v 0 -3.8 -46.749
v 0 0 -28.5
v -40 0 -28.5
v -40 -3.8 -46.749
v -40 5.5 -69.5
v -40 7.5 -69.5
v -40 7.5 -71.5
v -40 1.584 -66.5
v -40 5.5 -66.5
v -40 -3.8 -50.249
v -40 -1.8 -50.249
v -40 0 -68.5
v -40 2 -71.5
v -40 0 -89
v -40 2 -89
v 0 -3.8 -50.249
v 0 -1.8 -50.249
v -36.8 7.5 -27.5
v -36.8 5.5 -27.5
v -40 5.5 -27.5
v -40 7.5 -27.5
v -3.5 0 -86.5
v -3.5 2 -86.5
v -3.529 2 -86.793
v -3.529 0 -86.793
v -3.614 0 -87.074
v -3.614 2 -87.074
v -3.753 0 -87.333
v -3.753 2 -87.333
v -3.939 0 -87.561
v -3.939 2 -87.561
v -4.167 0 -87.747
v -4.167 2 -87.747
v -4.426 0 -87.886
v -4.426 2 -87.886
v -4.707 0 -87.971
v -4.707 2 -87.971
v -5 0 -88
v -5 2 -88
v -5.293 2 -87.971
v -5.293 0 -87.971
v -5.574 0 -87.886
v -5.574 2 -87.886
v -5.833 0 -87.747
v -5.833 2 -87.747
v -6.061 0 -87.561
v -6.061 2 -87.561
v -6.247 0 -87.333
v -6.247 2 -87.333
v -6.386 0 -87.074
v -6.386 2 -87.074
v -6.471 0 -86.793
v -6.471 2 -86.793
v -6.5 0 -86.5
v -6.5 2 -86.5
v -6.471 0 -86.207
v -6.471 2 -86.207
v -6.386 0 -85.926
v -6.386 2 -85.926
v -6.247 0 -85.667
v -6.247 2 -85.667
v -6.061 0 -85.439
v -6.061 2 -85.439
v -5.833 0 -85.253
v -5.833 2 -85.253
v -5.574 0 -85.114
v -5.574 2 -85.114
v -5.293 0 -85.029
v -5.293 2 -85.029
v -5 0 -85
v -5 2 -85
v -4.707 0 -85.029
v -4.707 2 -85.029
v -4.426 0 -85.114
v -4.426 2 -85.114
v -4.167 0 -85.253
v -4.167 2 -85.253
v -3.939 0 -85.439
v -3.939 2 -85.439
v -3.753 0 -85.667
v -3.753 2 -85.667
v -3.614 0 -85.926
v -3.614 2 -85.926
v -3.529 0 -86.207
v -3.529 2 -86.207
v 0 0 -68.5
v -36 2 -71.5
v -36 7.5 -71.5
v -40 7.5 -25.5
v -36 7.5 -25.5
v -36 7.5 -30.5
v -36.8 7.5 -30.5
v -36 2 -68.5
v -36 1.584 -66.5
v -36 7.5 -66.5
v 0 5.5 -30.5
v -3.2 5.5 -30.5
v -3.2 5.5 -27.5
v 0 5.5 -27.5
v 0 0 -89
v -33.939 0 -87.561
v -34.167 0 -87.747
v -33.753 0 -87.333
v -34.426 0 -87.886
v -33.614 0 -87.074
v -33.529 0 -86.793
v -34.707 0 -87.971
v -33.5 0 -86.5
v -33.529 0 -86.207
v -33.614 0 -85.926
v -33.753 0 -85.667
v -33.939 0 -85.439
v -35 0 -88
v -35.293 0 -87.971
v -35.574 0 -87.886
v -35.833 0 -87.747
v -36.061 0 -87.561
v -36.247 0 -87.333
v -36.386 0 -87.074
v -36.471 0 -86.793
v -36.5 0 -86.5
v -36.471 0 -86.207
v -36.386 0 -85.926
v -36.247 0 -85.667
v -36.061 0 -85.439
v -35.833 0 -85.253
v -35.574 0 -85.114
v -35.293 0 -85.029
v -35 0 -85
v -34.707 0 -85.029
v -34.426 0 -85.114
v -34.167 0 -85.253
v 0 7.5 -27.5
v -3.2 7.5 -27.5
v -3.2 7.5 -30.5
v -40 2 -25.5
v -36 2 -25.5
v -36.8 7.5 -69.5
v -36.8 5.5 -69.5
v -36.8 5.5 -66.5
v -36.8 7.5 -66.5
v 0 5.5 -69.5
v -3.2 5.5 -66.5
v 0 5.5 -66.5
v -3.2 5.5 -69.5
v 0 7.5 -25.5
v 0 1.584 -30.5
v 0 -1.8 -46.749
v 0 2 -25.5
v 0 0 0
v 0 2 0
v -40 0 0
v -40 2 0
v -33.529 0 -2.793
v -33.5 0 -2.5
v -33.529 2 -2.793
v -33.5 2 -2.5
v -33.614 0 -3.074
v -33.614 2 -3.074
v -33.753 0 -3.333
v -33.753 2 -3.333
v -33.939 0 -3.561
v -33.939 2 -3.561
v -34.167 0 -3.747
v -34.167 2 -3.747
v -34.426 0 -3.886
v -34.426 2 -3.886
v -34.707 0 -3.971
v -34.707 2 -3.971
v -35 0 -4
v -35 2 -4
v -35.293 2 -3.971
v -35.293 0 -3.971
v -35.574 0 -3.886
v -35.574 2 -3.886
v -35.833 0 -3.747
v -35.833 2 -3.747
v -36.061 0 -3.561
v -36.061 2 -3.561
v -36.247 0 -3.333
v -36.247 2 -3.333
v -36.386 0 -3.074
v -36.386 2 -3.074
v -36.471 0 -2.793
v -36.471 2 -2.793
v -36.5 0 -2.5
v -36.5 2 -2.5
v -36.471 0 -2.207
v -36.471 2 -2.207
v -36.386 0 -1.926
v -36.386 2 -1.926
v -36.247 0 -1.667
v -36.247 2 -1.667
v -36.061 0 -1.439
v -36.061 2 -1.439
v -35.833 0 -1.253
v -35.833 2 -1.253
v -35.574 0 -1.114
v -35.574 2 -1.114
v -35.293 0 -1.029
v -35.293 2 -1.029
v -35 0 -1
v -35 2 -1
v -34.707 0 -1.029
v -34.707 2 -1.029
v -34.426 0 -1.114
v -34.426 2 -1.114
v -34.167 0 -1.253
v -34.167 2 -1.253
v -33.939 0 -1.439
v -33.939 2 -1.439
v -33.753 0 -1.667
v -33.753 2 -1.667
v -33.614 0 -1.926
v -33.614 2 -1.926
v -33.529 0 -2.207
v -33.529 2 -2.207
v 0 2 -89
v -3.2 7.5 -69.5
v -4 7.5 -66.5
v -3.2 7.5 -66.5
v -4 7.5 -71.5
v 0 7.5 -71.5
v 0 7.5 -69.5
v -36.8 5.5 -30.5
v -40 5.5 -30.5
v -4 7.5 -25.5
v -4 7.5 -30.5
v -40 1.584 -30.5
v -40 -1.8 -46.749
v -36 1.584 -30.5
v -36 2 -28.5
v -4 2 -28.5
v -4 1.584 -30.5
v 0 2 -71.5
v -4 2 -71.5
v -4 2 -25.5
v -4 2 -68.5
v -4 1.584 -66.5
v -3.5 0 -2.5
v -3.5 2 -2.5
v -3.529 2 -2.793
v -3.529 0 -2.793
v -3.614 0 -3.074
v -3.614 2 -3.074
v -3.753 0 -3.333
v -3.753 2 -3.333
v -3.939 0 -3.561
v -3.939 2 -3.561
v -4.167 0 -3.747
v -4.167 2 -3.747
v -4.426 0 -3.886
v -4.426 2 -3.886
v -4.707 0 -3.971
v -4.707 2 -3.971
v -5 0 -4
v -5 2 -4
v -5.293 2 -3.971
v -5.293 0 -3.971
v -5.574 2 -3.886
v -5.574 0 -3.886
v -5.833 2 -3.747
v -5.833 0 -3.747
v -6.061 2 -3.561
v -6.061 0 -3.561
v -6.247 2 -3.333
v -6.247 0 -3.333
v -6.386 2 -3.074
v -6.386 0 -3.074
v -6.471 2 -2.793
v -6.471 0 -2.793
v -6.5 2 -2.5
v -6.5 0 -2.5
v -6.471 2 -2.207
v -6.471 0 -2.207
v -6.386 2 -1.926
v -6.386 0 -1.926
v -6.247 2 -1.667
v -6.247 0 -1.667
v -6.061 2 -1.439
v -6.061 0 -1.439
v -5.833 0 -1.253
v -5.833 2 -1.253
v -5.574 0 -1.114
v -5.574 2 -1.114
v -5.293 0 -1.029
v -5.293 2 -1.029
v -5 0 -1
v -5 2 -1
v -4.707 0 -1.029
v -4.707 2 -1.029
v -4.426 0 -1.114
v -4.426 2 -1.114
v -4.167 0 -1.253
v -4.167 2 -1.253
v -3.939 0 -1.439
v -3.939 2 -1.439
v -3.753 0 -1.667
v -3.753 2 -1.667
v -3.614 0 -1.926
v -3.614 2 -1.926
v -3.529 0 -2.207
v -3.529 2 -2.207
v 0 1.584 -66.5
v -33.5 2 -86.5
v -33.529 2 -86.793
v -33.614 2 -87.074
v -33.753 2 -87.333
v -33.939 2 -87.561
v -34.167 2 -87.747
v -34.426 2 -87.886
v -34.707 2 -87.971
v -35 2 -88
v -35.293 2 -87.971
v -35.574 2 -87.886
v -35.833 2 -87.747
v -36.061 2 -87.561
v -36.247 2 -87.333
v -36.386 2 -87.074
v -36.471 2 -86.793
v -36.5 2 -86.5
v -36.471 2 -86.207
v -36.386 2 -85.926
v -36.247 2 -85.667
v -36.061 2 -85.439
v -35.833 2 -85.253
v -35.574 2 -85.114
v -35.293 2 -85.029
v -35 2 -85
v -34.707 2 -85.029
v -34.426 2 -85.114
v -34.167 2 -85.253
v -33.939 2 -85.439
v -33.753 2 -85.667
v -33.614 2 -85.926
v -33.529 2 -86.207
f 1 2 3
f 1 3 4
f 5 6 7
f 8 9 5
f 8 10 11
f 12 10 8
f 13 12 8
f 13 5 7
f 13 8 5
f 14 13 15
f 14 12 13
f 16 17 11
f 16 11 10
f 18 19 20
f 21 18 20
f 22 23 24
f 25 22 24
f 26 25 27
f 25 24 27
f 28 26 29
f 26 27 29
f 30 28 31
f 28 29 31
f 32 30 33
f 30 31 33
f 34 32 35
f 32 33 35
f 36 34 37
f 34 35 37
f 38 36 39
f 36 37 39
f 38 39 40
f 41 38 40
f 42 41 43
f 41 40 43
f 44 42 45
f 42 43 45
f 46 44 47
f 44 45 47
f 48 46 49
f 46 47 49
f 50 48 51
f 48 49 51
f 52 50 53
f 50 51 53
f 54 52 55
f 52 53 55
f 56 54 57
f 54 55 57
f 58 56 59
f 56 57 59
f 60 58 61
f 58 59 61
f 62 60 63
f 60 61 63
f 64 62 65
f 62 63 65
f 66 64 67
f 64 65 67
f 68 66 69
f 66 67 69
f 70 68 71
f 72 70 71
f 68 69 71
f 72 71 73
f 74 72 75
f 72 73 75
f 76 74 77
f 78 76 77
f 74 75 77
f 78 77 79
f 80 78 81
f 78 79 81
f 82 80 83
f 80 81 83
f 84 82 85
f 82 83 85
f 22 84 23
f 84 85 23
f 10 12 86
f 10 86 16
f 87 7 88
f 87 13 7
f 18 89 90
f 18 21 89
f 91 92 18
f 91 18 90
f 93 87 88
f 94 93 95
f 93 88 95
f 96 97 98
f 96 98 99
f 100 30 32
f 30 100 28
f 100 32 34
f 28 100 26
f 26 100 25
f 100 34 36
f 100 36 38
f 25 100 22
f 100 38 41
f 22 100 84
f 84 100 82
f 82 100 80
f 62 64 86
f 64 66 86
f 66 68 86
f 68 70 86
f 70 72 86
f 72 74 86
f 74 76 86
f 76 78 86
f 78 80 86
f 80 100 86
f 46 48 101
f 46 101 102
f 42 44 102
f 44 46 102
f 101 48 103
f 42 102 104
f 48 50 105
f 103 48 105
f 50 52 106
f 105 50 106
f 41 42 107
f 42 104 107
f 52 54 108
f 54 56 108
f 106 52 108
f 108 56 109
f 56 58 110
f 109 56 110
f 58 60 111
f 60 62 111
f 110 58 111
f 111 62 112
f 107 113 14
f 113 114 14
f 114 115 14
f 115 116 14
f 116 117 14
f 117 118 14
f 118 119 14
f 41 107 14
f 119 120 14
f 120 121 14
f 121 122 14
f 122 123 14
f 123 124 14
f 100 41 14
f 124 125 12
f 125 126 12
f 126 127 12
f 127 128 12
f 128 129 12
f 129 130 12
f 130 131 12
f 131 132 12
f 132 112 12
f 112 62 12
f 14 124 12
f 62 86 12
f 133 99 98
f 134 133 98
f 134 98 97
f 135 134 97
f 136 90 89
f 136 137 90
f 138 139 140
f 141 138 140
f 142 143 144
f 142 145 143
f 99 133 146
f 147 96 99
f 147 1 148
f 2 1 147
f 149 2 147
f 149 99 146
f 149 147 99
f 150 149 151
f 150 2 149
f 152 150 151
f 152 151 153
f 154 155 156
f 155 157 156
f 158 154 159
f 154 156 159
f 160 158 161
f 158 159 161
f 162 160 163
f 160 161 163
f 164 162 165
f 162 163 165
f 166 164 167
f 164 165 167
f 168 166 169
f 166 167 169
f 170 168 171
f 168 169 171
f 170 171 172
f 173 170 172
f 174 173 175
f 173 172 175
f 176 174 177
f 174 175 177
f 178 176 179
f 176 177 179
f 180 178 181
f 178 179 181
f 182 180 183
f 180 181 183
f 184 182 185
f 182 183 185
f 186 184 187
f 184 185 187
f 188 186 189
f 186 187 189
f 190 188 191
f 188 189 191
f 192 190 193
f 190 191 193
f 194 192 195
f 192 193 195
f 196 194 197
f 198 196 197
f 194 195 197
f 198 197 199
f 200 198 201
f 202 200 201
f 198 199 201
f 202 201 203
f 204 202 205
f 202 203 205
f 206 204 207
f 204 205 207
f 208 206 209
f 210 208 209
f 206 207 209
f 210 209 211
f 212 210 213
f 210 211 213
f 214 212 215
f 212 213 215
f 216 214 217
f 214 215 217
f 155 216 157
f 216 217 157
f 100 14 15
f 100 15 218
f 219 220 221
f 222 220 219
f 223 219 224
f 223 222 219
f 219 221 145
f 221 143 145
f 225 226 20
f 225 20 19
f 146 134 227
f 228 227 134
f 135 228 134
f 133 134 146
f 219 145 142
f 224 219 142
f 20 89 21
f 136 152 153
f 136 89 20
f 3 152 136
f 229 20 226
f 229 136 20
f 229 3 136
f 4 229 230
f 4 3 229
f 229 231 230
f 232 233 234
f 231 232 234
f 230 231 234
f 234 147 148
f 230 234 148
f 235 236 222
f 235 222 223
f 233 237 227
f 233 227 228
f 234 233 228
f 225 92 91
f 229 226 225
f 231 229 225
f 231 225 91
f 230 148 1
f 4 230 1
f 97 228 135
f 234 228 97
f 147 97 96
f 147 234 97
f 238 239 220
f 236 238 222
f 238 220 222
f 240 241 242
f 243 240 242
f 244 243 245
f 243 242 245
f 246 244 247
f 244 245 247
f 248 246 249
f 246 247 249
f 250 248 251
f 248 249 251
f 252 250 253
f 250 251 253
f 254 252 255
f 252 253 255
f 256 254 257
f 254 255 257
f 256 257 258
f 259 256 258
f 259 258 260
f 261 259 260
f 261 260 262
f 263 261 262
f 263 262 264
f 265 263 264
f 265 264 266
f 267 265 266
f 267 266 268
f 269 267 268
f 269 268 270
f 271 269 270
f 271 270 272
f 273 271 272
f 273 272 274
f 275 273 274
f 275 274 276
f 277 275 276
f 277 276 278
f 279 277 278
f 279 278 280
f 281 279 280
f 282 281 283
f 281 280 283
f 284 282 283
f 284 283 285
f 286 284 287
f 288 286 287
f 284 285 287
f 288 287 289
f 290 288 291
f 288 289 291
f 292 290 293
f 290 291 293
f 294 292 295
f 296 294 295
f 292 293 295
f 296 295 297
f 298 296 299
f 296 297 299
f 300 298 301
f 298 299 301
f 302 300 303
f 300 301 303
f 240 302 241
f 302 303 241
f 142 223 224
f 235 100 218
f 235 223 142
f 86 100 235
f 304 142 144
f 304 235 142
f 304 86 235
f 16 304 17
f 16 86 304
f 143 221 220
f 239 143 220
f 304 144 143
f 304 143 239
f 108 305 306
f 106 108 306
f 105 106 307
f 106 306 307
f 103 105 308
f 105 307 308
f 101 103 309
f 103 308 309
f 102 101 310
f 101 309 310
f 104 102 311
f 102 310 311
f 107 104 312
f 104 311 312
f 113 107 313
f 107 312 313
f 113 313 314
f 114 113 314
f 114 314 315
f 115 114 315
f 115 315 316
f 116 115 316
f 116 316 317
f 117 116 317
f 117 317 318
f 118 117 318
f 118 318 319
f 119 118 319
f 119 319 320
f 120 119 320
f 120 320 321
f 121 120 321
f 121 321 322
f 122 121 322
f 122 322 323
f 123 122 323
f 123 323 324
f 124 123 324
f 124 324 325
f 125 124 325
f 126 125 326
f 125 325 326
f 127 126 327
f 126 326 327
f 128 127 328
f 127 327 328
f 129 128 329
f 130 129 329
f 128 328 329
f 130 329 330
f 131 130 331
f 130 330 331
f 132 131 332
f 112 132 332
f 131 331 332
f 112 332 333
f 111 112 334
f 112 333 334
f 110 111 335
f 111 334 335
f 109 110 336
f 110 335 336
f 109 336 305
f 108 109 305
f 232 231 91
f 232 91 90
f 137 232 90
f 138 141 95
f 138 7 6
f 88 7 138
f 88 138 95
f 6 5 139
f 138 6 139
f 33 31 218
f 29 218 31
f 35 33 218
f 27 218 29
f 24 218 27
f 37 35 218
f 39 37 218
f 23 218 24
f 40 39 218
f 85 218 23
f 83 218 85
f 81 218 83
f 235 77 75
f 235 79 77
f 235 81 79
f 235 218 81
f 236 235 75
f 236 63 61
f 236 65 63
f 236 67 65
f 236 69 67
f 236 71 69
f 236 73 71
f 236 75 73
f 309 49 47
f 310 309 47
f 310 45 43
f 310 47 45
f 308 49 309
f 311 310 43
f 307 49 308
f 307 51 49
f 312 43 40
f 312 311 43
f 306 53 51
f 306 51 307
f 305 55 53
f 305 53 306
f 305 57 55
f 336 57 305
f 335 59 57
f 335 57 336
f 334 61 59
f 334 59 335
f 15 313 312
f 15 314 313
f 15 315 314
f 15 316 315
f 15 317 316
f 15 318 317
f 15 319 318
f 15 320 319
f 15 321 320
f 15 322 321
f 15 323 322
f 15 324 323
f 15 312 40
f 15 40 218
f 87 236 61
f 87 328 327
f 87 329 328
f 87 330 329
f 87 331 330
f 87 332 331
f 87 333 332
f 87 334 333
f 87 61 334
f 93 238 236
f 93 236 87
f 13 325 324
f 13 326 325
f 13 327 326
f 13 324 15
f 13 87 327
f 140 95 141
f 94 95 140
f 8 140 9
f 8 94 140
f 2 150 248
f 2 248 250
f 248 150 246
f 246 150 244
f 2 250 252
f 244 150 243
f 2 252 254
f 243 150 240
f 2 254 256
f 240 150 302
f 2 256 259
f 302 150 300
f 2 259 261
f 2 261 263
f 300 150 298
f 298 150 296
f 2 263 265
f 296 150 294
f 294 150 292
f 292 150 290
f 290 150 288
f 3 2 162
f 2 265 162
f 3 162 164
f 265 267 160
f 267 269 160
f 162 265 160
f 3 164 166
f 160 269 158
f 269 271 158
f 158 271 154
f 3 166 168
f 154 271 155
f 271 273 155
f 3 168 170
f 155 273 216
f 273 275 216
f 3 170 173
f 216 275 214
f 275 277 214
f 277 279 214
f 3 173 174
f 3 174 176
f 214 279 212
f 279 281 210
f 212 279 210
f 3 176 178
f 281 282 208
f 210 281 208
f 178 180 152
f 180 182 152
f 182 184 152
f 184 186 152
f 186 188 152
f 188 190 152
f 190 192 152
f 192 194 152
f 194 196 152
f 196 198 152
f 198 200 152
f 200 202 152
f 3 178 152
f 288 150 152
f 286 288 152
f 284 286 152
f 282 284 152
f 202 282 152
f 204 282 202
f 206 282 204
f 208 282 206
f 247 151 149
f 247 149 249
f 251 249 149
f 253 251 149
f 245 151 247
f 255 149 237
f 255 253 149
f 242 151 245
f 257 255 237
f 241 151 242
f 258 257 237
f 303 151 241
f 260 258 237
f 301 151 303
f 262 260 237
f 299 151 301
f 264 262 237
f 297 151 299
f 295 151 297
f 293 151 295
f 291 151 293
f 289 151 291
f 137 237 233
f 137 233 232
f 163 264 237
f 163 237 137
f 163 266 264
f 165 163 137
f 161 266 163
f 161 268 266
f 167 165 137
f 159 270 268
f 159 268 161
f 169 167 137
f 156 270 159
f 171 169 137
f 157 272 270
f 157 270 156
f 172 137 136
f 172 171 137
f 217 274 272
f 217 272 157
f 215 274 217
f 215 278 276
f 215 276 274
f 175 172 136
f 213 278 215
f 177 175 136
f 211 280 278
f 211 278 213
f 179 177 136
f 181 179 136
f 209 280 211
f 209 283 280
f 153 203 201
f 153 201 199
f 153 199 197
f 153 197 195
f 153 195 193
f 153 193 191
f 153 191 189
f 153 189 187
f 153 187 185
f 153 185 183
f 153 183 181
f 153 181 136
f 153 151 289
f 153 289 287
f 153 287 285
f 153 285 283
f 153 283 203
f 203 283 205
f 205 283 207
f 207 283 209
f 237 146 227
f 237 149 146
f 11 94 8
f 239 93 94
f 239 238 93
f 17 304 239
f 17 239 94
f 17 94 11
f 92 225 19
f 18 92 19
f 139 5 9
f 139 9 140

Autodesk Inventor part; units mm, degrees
ref_plane "YZ Plane" through (0, 0, 0) normal (1, 0, 0) x (0, 1, 0)
ref_plane "XZ Plane" through (0, 0, 0) normal (0, 1, 0) x (-1, 0, 0)
ref_plane "XY Plane" through (0, 0, 0) normal (0, 0, 1) x (1, 0, 0)
sketch "Szkic1" plane through (0, 0, 0) normal (0, 1, 0) x (-1, 0, 0)
  line L0 (0, 0) -> (40, 0)
  line L1 (40, 0) -> (40, -28.5)
  line L2 (40, -28.5) -> (0, -28.5)
  line L3 (0, -28.5) -> (0, 0)
  line L4 (0, -68.5) -> (40, -68.5)
  line L5 (40, -68.5) -> (40, -89)
  line L6 (40, -89) -> (0, -89)
  line L7 (0, -89) -> (0, -68.5)
  line L8 (22.9187, -28.5) -> (22.9187, -68.5)
  dimension "d0" = 40
  dimension "d1" = 28.5
  dimension "d3" = 20.5
  dimension "d84" = 40
extrude "Wyciągnięcie proste1" add sketch "Szkic1" along normal blind 2
sketch "Szkic2" plane through (0, 0, 0) normal (1, 0, 0) x (0, 0, -1)
  line L0 (48.4992, 0) -> (48.4992, -3.8)
  line L1 (0, 0) -> (28.5, 0) projected
  line L2 (28.5, 0) -> (48.5, 0)
  line L3 (89, 0) -> (68.5, 0) projected
  line L4 (48.4992, -3.8) -> (50.2492, -3.8)
  line L5 (48.4992, -3.8) -> (46.7492, -3.8)
  line L6 (28.5, 0) -> (46.7492, -3.8)
  line L7 (28.5, 0) -> (28.5, 2) projected
  line L8 (28.5, 2) -> (46.7492, -1.8)
  line L9 (46.7492, -1.8) -> (46.7492, -3.8)
  line L10 (68.5, 0) -> (50.2492, -3.8)
  line L11 (68.5, 0) -> (68.5, 2) projected
  line L12 (68.5, 2) -> (50.2492, -1.8)
  line L13 (50.2492, -1.8) -> (50.2492, -3.8)
  dimension "d8" = 20
extrude "Wyciągnięcie proste2" add sketch "Szkic2" against normal blind 40 contours L13 L12 L11 L10 | L8 L9 L6 L2 | L2 L7 L8
sketch "Szkic3" plane through (0, 2, 0) normal (0, 1, 0) x (1, 0, 0)
  line L0 (-40, 46.7492) -> (-40, 28.5) projected
  line L1 (-40, 28.5) -> (-36, 28.5)
  line L2 (-36, 28.5) -> (-36, 25.5)
  line L3 (-36, 25.5) -> (-40, 25.5)
  line L4 (-40, 25.5) -> (-40, 28.5)
  line L5 (-36, 28.5) -> (-40, 28.5)
  line L6 (-40, 28.5) -> (-40, 30.5)
  line L7 (-40, 30.5) -> (-36, 30.5)
  line L8 (-36, 30.5) -> (-36, 28.5)
  line L9 (-36, 71.5) -> (-36, 69.5)
  line L10 (-40, 71.5) -> (-36, 71.5)
  line L11 (-40, 69.5) -> (-40, 71.5)
  line L12 (-40, 66.5) -> (-40, 69.5)
  line L13 (-36, 66.5) -> (-40, 66.5)
  line L14 (-36, 69.5) -> (-36, 66.5)
  line L15 (0, 28.5) -> (0, 25.5)
  line L16 (0, 30.5) -> (0, 28.5)
  line L17 (-4, 30.5) -> (0, 30.5)
  line L18 (-4, 28.5) -> (-4, 30.5)
  line L19 (-4, 25.5) -> (-4, 28.5)
  line L20 (0, 25.5) -> (-4, 25.5)
  line L21 (-4, 71.5) -> (0, 71.5)
  line L22 (-4, 69.5) -> (-4, 71.5)
  line L23 (-4, 66.5) -> (-4, 69.5)
  line L24 (0, 69.5) -> (0, 66.5)
  line L25 (0, 71.5) -> (0, 69.5)
  line L26 (0, 66.5) -> (-4, 66.5)
  point P0 (0, 0)
  dimension "d13" = 4
  dimension "d14" = 3
  dimension "d15" = 2
  dimension "d18" = 41
  dimension "d25" = 36
  dimension "d32" = 36
extrude "Wyciągnięcie proste3" add sketch "Szkic3" along normal blind 3.5
sketch "Szkic5" plane through (-40, 0, -89) normal (-1, 0, 0) x (0, 0, 1)
  line L0 (22.5, 2) -> (20.5, 2) projected
  line L1 (22.5, 2) -> (20.5, 2)
  line L2 (20.5, 2) -> (22.5, 1.5836)
  line L3 (38.7508, -1.8) -> (20.5, 2) projected
  line L4 (20.5, 2) -> (22.5, 2) projected
  line L5 (22.5, 2) -> (22.5, 1.5836)
  line L6 (58.5, 2) -> (60.5, 2) projected
  line L7 (60.5, 2) -> (42.2508, -1.8) projected
  line L8 (60.5, 2) -> (58.5, 2)
  line L9 (58.5, 1.5835) -> (58.5, 2)
  line L10 (58.5, 1.5835) -> (60.5, 2)
  point P0 (89, 0)
extrude "Wyciągnięcie proste5" add sketch "Szkic5" against normal blind 4
sketch "Szkic6" plane through (0, 5.5, 0) normal (0, 1, 0) x (1, 0, 0)
  line L0 (-36, 25.5) -> (-36, 30.5) projected
  line L1 (-36, 25.5) -> (-40, 25.5) projected
  line L2 (-36, 30.5) -> (-36.8, 30.5)
  line L3 (-36.8, 30.5) -> (-36.8, 25.5)
  line L4 (-36.8, 25.5) -> (-36, 25.5)
  line L5 (-36, 25.5) -> (-36, 30.5)
  line L6 (-36, 66.5) -> (-36, 71.5)
  line L7 (-36.8, 71.5) -> (-36.8, 66.5)
  line L8 (-36.8, 66.5) -> (-36, 66.5)
  line L9 (-36, 71.5) -> (-36.8, 71.5)
  line L10 (-4, 30.5) -> (-4, 25.5)
  line L11 (-3.2, 25.5) -> (-3.2, 30.5)
  line L12 (-3.2, 30.5) -> (-4, 30.5)
  line L13 (-4, 25.5) -> (-3.2, 25.5)
  line L14 (-4, 71.5) -> (-4, 66.5)
  line L15 (-3.2, 66.5) -> (-3.2, 71.5)
  line L16 (-3.2, 71.5) -> (-4, 71.5)
  line L17 (-4, 66.5) -> (-3.2, 66.5)
  point P0 (0, 0)
  dimension "d43" = 0.8
  dimension "d48" = 41
  dimension "d55" = 32.8
extrude "Wyciągnięcie proste6" add sketch "Szkic6" along normal blind 2
sketch "Szkic7" plane through (0, 5.5, 0) normal (0, 1, 0) x (1, 0, 0)
  line L0 (-40, 25.5) -> (-40, 0) projected
  line L1 (-36.8, 30.5) -> (-36.8, 25.5) projected
  line L2 (-40, 25.5) -> (-36.8, 25.5)
  line L3 (-36.8, 25.5) -> (-36.8, 27.5)
  line L4 (-36.8, 27.5) -> (-40, 27.5)
  line L5 (-40, 27.5) -> (-40, 25.5)
  line L6 (-36.8, 71.5) -> (-40, 71.5)
  line L7 (-40, 71.5) -> (-40, 69.5)
  line L8 (-40, 69.5) -> (-36.8, 69.5)
  line L9 (-36.8, 69.5) -> (-36.8, 71.5)
  line L10 (-3.2, 71.5) -> (-3.2, 69.5)
  line L11 (-3.2, 69.5) -> (0, 69.5)
  line L12 (0, 69.5) -> (0, 71.5)
  line L13 (0, 71.5) -> (-3.2, 71.5)
  line L14 (-3.2, 25.5) -> (0, 25.5)
  line L15 (-3.2, 27.5) -> (-3.2, 25.5)
  line L16 (0, 27.5) -> (-3.2, 27.5)
  line L17 (0, 25.5) -> (0, 27.5)
  point P0 (0, 0)
  dimension "d60" = 2
  dimension "d63" = 44
  dimension "d70" = 36.8
  dimension "d77" = 44
extrude "Wyciągnięcie proste7" add sketch "Szkic7" along normal blind 2
sketch "Szkic8" plane through (0, 0, 0) normal (1, 0, 0) x (0, 0, -1)
  line L0 (28.5, 2) -> (30.5, 2) projected
  line L1 (28.5, 2) -> (30.5, 2)
  line L2 (30.5, 2) -> (30.5, 1.5835)
  line L3 (46.7492, -1.8) -> (28.5, 2) projected
  line L4 (28.5, 2) -> (30.5, 1.5835)
  line L5 (66.5, 2) -> (68.5, 2) projected
  line L6 (66.5, 2) -> (68.5, 2)
  line L7 (68.5, 2) -> (50.2492, -1.8) projected
  line L8 (66.5, 2) -> (66.5, 1.5836)
  line L9 (66.5, 1.5836) -> (68.5, 2)
  point P0 (0, 0)
extrude "Wyciągnięcie proste8" add sketch "Szkic8" against normal blind 4
sketch "Szkic9" plane through (0, 2, 0) normal (0, 1, 0) x (1, 0, 0)
  line L0 (0, 0) -> (0, 25.5) projected
  line L1 (0, 2.5) -> (-5, 2.5)
  line L2 (-40, 0) -> (0, 0) projected
  line L3 (-5, 0) -> (-5, 2.5)
  line L4 (-40, 2.5) -> (-35, 2.5)
  line L5 (-35, 0) -> (-35, 2.5)
  circle A0 centre (-35, 2.5) radius 1.5
  circle A1 centre (-5, 2.5) radius 1.5
  circle A2 centre (-5, 86.5) radius 1.5
  circle A3 centre (-35, 86.5) radius 1.5
  dimension "d87" = 5
  dimension "d88" = 2.5
  dimension "d89" = 5
  dimension "d91" = 2.5
  dimension "d92" = 3
  dimension "d93" = 3
  dimension "d96" = 84
extrude "Wyciągnięcie proste9" cut sketch "Szkic9" against normal blind 3 contours A0 L4 L5 | L5 L4 A0 | A1 L3 L1 | L1 L3 A1 | A2 | A3
equation "\"d101\" = d93"
properties part number "air_duct_inside"
